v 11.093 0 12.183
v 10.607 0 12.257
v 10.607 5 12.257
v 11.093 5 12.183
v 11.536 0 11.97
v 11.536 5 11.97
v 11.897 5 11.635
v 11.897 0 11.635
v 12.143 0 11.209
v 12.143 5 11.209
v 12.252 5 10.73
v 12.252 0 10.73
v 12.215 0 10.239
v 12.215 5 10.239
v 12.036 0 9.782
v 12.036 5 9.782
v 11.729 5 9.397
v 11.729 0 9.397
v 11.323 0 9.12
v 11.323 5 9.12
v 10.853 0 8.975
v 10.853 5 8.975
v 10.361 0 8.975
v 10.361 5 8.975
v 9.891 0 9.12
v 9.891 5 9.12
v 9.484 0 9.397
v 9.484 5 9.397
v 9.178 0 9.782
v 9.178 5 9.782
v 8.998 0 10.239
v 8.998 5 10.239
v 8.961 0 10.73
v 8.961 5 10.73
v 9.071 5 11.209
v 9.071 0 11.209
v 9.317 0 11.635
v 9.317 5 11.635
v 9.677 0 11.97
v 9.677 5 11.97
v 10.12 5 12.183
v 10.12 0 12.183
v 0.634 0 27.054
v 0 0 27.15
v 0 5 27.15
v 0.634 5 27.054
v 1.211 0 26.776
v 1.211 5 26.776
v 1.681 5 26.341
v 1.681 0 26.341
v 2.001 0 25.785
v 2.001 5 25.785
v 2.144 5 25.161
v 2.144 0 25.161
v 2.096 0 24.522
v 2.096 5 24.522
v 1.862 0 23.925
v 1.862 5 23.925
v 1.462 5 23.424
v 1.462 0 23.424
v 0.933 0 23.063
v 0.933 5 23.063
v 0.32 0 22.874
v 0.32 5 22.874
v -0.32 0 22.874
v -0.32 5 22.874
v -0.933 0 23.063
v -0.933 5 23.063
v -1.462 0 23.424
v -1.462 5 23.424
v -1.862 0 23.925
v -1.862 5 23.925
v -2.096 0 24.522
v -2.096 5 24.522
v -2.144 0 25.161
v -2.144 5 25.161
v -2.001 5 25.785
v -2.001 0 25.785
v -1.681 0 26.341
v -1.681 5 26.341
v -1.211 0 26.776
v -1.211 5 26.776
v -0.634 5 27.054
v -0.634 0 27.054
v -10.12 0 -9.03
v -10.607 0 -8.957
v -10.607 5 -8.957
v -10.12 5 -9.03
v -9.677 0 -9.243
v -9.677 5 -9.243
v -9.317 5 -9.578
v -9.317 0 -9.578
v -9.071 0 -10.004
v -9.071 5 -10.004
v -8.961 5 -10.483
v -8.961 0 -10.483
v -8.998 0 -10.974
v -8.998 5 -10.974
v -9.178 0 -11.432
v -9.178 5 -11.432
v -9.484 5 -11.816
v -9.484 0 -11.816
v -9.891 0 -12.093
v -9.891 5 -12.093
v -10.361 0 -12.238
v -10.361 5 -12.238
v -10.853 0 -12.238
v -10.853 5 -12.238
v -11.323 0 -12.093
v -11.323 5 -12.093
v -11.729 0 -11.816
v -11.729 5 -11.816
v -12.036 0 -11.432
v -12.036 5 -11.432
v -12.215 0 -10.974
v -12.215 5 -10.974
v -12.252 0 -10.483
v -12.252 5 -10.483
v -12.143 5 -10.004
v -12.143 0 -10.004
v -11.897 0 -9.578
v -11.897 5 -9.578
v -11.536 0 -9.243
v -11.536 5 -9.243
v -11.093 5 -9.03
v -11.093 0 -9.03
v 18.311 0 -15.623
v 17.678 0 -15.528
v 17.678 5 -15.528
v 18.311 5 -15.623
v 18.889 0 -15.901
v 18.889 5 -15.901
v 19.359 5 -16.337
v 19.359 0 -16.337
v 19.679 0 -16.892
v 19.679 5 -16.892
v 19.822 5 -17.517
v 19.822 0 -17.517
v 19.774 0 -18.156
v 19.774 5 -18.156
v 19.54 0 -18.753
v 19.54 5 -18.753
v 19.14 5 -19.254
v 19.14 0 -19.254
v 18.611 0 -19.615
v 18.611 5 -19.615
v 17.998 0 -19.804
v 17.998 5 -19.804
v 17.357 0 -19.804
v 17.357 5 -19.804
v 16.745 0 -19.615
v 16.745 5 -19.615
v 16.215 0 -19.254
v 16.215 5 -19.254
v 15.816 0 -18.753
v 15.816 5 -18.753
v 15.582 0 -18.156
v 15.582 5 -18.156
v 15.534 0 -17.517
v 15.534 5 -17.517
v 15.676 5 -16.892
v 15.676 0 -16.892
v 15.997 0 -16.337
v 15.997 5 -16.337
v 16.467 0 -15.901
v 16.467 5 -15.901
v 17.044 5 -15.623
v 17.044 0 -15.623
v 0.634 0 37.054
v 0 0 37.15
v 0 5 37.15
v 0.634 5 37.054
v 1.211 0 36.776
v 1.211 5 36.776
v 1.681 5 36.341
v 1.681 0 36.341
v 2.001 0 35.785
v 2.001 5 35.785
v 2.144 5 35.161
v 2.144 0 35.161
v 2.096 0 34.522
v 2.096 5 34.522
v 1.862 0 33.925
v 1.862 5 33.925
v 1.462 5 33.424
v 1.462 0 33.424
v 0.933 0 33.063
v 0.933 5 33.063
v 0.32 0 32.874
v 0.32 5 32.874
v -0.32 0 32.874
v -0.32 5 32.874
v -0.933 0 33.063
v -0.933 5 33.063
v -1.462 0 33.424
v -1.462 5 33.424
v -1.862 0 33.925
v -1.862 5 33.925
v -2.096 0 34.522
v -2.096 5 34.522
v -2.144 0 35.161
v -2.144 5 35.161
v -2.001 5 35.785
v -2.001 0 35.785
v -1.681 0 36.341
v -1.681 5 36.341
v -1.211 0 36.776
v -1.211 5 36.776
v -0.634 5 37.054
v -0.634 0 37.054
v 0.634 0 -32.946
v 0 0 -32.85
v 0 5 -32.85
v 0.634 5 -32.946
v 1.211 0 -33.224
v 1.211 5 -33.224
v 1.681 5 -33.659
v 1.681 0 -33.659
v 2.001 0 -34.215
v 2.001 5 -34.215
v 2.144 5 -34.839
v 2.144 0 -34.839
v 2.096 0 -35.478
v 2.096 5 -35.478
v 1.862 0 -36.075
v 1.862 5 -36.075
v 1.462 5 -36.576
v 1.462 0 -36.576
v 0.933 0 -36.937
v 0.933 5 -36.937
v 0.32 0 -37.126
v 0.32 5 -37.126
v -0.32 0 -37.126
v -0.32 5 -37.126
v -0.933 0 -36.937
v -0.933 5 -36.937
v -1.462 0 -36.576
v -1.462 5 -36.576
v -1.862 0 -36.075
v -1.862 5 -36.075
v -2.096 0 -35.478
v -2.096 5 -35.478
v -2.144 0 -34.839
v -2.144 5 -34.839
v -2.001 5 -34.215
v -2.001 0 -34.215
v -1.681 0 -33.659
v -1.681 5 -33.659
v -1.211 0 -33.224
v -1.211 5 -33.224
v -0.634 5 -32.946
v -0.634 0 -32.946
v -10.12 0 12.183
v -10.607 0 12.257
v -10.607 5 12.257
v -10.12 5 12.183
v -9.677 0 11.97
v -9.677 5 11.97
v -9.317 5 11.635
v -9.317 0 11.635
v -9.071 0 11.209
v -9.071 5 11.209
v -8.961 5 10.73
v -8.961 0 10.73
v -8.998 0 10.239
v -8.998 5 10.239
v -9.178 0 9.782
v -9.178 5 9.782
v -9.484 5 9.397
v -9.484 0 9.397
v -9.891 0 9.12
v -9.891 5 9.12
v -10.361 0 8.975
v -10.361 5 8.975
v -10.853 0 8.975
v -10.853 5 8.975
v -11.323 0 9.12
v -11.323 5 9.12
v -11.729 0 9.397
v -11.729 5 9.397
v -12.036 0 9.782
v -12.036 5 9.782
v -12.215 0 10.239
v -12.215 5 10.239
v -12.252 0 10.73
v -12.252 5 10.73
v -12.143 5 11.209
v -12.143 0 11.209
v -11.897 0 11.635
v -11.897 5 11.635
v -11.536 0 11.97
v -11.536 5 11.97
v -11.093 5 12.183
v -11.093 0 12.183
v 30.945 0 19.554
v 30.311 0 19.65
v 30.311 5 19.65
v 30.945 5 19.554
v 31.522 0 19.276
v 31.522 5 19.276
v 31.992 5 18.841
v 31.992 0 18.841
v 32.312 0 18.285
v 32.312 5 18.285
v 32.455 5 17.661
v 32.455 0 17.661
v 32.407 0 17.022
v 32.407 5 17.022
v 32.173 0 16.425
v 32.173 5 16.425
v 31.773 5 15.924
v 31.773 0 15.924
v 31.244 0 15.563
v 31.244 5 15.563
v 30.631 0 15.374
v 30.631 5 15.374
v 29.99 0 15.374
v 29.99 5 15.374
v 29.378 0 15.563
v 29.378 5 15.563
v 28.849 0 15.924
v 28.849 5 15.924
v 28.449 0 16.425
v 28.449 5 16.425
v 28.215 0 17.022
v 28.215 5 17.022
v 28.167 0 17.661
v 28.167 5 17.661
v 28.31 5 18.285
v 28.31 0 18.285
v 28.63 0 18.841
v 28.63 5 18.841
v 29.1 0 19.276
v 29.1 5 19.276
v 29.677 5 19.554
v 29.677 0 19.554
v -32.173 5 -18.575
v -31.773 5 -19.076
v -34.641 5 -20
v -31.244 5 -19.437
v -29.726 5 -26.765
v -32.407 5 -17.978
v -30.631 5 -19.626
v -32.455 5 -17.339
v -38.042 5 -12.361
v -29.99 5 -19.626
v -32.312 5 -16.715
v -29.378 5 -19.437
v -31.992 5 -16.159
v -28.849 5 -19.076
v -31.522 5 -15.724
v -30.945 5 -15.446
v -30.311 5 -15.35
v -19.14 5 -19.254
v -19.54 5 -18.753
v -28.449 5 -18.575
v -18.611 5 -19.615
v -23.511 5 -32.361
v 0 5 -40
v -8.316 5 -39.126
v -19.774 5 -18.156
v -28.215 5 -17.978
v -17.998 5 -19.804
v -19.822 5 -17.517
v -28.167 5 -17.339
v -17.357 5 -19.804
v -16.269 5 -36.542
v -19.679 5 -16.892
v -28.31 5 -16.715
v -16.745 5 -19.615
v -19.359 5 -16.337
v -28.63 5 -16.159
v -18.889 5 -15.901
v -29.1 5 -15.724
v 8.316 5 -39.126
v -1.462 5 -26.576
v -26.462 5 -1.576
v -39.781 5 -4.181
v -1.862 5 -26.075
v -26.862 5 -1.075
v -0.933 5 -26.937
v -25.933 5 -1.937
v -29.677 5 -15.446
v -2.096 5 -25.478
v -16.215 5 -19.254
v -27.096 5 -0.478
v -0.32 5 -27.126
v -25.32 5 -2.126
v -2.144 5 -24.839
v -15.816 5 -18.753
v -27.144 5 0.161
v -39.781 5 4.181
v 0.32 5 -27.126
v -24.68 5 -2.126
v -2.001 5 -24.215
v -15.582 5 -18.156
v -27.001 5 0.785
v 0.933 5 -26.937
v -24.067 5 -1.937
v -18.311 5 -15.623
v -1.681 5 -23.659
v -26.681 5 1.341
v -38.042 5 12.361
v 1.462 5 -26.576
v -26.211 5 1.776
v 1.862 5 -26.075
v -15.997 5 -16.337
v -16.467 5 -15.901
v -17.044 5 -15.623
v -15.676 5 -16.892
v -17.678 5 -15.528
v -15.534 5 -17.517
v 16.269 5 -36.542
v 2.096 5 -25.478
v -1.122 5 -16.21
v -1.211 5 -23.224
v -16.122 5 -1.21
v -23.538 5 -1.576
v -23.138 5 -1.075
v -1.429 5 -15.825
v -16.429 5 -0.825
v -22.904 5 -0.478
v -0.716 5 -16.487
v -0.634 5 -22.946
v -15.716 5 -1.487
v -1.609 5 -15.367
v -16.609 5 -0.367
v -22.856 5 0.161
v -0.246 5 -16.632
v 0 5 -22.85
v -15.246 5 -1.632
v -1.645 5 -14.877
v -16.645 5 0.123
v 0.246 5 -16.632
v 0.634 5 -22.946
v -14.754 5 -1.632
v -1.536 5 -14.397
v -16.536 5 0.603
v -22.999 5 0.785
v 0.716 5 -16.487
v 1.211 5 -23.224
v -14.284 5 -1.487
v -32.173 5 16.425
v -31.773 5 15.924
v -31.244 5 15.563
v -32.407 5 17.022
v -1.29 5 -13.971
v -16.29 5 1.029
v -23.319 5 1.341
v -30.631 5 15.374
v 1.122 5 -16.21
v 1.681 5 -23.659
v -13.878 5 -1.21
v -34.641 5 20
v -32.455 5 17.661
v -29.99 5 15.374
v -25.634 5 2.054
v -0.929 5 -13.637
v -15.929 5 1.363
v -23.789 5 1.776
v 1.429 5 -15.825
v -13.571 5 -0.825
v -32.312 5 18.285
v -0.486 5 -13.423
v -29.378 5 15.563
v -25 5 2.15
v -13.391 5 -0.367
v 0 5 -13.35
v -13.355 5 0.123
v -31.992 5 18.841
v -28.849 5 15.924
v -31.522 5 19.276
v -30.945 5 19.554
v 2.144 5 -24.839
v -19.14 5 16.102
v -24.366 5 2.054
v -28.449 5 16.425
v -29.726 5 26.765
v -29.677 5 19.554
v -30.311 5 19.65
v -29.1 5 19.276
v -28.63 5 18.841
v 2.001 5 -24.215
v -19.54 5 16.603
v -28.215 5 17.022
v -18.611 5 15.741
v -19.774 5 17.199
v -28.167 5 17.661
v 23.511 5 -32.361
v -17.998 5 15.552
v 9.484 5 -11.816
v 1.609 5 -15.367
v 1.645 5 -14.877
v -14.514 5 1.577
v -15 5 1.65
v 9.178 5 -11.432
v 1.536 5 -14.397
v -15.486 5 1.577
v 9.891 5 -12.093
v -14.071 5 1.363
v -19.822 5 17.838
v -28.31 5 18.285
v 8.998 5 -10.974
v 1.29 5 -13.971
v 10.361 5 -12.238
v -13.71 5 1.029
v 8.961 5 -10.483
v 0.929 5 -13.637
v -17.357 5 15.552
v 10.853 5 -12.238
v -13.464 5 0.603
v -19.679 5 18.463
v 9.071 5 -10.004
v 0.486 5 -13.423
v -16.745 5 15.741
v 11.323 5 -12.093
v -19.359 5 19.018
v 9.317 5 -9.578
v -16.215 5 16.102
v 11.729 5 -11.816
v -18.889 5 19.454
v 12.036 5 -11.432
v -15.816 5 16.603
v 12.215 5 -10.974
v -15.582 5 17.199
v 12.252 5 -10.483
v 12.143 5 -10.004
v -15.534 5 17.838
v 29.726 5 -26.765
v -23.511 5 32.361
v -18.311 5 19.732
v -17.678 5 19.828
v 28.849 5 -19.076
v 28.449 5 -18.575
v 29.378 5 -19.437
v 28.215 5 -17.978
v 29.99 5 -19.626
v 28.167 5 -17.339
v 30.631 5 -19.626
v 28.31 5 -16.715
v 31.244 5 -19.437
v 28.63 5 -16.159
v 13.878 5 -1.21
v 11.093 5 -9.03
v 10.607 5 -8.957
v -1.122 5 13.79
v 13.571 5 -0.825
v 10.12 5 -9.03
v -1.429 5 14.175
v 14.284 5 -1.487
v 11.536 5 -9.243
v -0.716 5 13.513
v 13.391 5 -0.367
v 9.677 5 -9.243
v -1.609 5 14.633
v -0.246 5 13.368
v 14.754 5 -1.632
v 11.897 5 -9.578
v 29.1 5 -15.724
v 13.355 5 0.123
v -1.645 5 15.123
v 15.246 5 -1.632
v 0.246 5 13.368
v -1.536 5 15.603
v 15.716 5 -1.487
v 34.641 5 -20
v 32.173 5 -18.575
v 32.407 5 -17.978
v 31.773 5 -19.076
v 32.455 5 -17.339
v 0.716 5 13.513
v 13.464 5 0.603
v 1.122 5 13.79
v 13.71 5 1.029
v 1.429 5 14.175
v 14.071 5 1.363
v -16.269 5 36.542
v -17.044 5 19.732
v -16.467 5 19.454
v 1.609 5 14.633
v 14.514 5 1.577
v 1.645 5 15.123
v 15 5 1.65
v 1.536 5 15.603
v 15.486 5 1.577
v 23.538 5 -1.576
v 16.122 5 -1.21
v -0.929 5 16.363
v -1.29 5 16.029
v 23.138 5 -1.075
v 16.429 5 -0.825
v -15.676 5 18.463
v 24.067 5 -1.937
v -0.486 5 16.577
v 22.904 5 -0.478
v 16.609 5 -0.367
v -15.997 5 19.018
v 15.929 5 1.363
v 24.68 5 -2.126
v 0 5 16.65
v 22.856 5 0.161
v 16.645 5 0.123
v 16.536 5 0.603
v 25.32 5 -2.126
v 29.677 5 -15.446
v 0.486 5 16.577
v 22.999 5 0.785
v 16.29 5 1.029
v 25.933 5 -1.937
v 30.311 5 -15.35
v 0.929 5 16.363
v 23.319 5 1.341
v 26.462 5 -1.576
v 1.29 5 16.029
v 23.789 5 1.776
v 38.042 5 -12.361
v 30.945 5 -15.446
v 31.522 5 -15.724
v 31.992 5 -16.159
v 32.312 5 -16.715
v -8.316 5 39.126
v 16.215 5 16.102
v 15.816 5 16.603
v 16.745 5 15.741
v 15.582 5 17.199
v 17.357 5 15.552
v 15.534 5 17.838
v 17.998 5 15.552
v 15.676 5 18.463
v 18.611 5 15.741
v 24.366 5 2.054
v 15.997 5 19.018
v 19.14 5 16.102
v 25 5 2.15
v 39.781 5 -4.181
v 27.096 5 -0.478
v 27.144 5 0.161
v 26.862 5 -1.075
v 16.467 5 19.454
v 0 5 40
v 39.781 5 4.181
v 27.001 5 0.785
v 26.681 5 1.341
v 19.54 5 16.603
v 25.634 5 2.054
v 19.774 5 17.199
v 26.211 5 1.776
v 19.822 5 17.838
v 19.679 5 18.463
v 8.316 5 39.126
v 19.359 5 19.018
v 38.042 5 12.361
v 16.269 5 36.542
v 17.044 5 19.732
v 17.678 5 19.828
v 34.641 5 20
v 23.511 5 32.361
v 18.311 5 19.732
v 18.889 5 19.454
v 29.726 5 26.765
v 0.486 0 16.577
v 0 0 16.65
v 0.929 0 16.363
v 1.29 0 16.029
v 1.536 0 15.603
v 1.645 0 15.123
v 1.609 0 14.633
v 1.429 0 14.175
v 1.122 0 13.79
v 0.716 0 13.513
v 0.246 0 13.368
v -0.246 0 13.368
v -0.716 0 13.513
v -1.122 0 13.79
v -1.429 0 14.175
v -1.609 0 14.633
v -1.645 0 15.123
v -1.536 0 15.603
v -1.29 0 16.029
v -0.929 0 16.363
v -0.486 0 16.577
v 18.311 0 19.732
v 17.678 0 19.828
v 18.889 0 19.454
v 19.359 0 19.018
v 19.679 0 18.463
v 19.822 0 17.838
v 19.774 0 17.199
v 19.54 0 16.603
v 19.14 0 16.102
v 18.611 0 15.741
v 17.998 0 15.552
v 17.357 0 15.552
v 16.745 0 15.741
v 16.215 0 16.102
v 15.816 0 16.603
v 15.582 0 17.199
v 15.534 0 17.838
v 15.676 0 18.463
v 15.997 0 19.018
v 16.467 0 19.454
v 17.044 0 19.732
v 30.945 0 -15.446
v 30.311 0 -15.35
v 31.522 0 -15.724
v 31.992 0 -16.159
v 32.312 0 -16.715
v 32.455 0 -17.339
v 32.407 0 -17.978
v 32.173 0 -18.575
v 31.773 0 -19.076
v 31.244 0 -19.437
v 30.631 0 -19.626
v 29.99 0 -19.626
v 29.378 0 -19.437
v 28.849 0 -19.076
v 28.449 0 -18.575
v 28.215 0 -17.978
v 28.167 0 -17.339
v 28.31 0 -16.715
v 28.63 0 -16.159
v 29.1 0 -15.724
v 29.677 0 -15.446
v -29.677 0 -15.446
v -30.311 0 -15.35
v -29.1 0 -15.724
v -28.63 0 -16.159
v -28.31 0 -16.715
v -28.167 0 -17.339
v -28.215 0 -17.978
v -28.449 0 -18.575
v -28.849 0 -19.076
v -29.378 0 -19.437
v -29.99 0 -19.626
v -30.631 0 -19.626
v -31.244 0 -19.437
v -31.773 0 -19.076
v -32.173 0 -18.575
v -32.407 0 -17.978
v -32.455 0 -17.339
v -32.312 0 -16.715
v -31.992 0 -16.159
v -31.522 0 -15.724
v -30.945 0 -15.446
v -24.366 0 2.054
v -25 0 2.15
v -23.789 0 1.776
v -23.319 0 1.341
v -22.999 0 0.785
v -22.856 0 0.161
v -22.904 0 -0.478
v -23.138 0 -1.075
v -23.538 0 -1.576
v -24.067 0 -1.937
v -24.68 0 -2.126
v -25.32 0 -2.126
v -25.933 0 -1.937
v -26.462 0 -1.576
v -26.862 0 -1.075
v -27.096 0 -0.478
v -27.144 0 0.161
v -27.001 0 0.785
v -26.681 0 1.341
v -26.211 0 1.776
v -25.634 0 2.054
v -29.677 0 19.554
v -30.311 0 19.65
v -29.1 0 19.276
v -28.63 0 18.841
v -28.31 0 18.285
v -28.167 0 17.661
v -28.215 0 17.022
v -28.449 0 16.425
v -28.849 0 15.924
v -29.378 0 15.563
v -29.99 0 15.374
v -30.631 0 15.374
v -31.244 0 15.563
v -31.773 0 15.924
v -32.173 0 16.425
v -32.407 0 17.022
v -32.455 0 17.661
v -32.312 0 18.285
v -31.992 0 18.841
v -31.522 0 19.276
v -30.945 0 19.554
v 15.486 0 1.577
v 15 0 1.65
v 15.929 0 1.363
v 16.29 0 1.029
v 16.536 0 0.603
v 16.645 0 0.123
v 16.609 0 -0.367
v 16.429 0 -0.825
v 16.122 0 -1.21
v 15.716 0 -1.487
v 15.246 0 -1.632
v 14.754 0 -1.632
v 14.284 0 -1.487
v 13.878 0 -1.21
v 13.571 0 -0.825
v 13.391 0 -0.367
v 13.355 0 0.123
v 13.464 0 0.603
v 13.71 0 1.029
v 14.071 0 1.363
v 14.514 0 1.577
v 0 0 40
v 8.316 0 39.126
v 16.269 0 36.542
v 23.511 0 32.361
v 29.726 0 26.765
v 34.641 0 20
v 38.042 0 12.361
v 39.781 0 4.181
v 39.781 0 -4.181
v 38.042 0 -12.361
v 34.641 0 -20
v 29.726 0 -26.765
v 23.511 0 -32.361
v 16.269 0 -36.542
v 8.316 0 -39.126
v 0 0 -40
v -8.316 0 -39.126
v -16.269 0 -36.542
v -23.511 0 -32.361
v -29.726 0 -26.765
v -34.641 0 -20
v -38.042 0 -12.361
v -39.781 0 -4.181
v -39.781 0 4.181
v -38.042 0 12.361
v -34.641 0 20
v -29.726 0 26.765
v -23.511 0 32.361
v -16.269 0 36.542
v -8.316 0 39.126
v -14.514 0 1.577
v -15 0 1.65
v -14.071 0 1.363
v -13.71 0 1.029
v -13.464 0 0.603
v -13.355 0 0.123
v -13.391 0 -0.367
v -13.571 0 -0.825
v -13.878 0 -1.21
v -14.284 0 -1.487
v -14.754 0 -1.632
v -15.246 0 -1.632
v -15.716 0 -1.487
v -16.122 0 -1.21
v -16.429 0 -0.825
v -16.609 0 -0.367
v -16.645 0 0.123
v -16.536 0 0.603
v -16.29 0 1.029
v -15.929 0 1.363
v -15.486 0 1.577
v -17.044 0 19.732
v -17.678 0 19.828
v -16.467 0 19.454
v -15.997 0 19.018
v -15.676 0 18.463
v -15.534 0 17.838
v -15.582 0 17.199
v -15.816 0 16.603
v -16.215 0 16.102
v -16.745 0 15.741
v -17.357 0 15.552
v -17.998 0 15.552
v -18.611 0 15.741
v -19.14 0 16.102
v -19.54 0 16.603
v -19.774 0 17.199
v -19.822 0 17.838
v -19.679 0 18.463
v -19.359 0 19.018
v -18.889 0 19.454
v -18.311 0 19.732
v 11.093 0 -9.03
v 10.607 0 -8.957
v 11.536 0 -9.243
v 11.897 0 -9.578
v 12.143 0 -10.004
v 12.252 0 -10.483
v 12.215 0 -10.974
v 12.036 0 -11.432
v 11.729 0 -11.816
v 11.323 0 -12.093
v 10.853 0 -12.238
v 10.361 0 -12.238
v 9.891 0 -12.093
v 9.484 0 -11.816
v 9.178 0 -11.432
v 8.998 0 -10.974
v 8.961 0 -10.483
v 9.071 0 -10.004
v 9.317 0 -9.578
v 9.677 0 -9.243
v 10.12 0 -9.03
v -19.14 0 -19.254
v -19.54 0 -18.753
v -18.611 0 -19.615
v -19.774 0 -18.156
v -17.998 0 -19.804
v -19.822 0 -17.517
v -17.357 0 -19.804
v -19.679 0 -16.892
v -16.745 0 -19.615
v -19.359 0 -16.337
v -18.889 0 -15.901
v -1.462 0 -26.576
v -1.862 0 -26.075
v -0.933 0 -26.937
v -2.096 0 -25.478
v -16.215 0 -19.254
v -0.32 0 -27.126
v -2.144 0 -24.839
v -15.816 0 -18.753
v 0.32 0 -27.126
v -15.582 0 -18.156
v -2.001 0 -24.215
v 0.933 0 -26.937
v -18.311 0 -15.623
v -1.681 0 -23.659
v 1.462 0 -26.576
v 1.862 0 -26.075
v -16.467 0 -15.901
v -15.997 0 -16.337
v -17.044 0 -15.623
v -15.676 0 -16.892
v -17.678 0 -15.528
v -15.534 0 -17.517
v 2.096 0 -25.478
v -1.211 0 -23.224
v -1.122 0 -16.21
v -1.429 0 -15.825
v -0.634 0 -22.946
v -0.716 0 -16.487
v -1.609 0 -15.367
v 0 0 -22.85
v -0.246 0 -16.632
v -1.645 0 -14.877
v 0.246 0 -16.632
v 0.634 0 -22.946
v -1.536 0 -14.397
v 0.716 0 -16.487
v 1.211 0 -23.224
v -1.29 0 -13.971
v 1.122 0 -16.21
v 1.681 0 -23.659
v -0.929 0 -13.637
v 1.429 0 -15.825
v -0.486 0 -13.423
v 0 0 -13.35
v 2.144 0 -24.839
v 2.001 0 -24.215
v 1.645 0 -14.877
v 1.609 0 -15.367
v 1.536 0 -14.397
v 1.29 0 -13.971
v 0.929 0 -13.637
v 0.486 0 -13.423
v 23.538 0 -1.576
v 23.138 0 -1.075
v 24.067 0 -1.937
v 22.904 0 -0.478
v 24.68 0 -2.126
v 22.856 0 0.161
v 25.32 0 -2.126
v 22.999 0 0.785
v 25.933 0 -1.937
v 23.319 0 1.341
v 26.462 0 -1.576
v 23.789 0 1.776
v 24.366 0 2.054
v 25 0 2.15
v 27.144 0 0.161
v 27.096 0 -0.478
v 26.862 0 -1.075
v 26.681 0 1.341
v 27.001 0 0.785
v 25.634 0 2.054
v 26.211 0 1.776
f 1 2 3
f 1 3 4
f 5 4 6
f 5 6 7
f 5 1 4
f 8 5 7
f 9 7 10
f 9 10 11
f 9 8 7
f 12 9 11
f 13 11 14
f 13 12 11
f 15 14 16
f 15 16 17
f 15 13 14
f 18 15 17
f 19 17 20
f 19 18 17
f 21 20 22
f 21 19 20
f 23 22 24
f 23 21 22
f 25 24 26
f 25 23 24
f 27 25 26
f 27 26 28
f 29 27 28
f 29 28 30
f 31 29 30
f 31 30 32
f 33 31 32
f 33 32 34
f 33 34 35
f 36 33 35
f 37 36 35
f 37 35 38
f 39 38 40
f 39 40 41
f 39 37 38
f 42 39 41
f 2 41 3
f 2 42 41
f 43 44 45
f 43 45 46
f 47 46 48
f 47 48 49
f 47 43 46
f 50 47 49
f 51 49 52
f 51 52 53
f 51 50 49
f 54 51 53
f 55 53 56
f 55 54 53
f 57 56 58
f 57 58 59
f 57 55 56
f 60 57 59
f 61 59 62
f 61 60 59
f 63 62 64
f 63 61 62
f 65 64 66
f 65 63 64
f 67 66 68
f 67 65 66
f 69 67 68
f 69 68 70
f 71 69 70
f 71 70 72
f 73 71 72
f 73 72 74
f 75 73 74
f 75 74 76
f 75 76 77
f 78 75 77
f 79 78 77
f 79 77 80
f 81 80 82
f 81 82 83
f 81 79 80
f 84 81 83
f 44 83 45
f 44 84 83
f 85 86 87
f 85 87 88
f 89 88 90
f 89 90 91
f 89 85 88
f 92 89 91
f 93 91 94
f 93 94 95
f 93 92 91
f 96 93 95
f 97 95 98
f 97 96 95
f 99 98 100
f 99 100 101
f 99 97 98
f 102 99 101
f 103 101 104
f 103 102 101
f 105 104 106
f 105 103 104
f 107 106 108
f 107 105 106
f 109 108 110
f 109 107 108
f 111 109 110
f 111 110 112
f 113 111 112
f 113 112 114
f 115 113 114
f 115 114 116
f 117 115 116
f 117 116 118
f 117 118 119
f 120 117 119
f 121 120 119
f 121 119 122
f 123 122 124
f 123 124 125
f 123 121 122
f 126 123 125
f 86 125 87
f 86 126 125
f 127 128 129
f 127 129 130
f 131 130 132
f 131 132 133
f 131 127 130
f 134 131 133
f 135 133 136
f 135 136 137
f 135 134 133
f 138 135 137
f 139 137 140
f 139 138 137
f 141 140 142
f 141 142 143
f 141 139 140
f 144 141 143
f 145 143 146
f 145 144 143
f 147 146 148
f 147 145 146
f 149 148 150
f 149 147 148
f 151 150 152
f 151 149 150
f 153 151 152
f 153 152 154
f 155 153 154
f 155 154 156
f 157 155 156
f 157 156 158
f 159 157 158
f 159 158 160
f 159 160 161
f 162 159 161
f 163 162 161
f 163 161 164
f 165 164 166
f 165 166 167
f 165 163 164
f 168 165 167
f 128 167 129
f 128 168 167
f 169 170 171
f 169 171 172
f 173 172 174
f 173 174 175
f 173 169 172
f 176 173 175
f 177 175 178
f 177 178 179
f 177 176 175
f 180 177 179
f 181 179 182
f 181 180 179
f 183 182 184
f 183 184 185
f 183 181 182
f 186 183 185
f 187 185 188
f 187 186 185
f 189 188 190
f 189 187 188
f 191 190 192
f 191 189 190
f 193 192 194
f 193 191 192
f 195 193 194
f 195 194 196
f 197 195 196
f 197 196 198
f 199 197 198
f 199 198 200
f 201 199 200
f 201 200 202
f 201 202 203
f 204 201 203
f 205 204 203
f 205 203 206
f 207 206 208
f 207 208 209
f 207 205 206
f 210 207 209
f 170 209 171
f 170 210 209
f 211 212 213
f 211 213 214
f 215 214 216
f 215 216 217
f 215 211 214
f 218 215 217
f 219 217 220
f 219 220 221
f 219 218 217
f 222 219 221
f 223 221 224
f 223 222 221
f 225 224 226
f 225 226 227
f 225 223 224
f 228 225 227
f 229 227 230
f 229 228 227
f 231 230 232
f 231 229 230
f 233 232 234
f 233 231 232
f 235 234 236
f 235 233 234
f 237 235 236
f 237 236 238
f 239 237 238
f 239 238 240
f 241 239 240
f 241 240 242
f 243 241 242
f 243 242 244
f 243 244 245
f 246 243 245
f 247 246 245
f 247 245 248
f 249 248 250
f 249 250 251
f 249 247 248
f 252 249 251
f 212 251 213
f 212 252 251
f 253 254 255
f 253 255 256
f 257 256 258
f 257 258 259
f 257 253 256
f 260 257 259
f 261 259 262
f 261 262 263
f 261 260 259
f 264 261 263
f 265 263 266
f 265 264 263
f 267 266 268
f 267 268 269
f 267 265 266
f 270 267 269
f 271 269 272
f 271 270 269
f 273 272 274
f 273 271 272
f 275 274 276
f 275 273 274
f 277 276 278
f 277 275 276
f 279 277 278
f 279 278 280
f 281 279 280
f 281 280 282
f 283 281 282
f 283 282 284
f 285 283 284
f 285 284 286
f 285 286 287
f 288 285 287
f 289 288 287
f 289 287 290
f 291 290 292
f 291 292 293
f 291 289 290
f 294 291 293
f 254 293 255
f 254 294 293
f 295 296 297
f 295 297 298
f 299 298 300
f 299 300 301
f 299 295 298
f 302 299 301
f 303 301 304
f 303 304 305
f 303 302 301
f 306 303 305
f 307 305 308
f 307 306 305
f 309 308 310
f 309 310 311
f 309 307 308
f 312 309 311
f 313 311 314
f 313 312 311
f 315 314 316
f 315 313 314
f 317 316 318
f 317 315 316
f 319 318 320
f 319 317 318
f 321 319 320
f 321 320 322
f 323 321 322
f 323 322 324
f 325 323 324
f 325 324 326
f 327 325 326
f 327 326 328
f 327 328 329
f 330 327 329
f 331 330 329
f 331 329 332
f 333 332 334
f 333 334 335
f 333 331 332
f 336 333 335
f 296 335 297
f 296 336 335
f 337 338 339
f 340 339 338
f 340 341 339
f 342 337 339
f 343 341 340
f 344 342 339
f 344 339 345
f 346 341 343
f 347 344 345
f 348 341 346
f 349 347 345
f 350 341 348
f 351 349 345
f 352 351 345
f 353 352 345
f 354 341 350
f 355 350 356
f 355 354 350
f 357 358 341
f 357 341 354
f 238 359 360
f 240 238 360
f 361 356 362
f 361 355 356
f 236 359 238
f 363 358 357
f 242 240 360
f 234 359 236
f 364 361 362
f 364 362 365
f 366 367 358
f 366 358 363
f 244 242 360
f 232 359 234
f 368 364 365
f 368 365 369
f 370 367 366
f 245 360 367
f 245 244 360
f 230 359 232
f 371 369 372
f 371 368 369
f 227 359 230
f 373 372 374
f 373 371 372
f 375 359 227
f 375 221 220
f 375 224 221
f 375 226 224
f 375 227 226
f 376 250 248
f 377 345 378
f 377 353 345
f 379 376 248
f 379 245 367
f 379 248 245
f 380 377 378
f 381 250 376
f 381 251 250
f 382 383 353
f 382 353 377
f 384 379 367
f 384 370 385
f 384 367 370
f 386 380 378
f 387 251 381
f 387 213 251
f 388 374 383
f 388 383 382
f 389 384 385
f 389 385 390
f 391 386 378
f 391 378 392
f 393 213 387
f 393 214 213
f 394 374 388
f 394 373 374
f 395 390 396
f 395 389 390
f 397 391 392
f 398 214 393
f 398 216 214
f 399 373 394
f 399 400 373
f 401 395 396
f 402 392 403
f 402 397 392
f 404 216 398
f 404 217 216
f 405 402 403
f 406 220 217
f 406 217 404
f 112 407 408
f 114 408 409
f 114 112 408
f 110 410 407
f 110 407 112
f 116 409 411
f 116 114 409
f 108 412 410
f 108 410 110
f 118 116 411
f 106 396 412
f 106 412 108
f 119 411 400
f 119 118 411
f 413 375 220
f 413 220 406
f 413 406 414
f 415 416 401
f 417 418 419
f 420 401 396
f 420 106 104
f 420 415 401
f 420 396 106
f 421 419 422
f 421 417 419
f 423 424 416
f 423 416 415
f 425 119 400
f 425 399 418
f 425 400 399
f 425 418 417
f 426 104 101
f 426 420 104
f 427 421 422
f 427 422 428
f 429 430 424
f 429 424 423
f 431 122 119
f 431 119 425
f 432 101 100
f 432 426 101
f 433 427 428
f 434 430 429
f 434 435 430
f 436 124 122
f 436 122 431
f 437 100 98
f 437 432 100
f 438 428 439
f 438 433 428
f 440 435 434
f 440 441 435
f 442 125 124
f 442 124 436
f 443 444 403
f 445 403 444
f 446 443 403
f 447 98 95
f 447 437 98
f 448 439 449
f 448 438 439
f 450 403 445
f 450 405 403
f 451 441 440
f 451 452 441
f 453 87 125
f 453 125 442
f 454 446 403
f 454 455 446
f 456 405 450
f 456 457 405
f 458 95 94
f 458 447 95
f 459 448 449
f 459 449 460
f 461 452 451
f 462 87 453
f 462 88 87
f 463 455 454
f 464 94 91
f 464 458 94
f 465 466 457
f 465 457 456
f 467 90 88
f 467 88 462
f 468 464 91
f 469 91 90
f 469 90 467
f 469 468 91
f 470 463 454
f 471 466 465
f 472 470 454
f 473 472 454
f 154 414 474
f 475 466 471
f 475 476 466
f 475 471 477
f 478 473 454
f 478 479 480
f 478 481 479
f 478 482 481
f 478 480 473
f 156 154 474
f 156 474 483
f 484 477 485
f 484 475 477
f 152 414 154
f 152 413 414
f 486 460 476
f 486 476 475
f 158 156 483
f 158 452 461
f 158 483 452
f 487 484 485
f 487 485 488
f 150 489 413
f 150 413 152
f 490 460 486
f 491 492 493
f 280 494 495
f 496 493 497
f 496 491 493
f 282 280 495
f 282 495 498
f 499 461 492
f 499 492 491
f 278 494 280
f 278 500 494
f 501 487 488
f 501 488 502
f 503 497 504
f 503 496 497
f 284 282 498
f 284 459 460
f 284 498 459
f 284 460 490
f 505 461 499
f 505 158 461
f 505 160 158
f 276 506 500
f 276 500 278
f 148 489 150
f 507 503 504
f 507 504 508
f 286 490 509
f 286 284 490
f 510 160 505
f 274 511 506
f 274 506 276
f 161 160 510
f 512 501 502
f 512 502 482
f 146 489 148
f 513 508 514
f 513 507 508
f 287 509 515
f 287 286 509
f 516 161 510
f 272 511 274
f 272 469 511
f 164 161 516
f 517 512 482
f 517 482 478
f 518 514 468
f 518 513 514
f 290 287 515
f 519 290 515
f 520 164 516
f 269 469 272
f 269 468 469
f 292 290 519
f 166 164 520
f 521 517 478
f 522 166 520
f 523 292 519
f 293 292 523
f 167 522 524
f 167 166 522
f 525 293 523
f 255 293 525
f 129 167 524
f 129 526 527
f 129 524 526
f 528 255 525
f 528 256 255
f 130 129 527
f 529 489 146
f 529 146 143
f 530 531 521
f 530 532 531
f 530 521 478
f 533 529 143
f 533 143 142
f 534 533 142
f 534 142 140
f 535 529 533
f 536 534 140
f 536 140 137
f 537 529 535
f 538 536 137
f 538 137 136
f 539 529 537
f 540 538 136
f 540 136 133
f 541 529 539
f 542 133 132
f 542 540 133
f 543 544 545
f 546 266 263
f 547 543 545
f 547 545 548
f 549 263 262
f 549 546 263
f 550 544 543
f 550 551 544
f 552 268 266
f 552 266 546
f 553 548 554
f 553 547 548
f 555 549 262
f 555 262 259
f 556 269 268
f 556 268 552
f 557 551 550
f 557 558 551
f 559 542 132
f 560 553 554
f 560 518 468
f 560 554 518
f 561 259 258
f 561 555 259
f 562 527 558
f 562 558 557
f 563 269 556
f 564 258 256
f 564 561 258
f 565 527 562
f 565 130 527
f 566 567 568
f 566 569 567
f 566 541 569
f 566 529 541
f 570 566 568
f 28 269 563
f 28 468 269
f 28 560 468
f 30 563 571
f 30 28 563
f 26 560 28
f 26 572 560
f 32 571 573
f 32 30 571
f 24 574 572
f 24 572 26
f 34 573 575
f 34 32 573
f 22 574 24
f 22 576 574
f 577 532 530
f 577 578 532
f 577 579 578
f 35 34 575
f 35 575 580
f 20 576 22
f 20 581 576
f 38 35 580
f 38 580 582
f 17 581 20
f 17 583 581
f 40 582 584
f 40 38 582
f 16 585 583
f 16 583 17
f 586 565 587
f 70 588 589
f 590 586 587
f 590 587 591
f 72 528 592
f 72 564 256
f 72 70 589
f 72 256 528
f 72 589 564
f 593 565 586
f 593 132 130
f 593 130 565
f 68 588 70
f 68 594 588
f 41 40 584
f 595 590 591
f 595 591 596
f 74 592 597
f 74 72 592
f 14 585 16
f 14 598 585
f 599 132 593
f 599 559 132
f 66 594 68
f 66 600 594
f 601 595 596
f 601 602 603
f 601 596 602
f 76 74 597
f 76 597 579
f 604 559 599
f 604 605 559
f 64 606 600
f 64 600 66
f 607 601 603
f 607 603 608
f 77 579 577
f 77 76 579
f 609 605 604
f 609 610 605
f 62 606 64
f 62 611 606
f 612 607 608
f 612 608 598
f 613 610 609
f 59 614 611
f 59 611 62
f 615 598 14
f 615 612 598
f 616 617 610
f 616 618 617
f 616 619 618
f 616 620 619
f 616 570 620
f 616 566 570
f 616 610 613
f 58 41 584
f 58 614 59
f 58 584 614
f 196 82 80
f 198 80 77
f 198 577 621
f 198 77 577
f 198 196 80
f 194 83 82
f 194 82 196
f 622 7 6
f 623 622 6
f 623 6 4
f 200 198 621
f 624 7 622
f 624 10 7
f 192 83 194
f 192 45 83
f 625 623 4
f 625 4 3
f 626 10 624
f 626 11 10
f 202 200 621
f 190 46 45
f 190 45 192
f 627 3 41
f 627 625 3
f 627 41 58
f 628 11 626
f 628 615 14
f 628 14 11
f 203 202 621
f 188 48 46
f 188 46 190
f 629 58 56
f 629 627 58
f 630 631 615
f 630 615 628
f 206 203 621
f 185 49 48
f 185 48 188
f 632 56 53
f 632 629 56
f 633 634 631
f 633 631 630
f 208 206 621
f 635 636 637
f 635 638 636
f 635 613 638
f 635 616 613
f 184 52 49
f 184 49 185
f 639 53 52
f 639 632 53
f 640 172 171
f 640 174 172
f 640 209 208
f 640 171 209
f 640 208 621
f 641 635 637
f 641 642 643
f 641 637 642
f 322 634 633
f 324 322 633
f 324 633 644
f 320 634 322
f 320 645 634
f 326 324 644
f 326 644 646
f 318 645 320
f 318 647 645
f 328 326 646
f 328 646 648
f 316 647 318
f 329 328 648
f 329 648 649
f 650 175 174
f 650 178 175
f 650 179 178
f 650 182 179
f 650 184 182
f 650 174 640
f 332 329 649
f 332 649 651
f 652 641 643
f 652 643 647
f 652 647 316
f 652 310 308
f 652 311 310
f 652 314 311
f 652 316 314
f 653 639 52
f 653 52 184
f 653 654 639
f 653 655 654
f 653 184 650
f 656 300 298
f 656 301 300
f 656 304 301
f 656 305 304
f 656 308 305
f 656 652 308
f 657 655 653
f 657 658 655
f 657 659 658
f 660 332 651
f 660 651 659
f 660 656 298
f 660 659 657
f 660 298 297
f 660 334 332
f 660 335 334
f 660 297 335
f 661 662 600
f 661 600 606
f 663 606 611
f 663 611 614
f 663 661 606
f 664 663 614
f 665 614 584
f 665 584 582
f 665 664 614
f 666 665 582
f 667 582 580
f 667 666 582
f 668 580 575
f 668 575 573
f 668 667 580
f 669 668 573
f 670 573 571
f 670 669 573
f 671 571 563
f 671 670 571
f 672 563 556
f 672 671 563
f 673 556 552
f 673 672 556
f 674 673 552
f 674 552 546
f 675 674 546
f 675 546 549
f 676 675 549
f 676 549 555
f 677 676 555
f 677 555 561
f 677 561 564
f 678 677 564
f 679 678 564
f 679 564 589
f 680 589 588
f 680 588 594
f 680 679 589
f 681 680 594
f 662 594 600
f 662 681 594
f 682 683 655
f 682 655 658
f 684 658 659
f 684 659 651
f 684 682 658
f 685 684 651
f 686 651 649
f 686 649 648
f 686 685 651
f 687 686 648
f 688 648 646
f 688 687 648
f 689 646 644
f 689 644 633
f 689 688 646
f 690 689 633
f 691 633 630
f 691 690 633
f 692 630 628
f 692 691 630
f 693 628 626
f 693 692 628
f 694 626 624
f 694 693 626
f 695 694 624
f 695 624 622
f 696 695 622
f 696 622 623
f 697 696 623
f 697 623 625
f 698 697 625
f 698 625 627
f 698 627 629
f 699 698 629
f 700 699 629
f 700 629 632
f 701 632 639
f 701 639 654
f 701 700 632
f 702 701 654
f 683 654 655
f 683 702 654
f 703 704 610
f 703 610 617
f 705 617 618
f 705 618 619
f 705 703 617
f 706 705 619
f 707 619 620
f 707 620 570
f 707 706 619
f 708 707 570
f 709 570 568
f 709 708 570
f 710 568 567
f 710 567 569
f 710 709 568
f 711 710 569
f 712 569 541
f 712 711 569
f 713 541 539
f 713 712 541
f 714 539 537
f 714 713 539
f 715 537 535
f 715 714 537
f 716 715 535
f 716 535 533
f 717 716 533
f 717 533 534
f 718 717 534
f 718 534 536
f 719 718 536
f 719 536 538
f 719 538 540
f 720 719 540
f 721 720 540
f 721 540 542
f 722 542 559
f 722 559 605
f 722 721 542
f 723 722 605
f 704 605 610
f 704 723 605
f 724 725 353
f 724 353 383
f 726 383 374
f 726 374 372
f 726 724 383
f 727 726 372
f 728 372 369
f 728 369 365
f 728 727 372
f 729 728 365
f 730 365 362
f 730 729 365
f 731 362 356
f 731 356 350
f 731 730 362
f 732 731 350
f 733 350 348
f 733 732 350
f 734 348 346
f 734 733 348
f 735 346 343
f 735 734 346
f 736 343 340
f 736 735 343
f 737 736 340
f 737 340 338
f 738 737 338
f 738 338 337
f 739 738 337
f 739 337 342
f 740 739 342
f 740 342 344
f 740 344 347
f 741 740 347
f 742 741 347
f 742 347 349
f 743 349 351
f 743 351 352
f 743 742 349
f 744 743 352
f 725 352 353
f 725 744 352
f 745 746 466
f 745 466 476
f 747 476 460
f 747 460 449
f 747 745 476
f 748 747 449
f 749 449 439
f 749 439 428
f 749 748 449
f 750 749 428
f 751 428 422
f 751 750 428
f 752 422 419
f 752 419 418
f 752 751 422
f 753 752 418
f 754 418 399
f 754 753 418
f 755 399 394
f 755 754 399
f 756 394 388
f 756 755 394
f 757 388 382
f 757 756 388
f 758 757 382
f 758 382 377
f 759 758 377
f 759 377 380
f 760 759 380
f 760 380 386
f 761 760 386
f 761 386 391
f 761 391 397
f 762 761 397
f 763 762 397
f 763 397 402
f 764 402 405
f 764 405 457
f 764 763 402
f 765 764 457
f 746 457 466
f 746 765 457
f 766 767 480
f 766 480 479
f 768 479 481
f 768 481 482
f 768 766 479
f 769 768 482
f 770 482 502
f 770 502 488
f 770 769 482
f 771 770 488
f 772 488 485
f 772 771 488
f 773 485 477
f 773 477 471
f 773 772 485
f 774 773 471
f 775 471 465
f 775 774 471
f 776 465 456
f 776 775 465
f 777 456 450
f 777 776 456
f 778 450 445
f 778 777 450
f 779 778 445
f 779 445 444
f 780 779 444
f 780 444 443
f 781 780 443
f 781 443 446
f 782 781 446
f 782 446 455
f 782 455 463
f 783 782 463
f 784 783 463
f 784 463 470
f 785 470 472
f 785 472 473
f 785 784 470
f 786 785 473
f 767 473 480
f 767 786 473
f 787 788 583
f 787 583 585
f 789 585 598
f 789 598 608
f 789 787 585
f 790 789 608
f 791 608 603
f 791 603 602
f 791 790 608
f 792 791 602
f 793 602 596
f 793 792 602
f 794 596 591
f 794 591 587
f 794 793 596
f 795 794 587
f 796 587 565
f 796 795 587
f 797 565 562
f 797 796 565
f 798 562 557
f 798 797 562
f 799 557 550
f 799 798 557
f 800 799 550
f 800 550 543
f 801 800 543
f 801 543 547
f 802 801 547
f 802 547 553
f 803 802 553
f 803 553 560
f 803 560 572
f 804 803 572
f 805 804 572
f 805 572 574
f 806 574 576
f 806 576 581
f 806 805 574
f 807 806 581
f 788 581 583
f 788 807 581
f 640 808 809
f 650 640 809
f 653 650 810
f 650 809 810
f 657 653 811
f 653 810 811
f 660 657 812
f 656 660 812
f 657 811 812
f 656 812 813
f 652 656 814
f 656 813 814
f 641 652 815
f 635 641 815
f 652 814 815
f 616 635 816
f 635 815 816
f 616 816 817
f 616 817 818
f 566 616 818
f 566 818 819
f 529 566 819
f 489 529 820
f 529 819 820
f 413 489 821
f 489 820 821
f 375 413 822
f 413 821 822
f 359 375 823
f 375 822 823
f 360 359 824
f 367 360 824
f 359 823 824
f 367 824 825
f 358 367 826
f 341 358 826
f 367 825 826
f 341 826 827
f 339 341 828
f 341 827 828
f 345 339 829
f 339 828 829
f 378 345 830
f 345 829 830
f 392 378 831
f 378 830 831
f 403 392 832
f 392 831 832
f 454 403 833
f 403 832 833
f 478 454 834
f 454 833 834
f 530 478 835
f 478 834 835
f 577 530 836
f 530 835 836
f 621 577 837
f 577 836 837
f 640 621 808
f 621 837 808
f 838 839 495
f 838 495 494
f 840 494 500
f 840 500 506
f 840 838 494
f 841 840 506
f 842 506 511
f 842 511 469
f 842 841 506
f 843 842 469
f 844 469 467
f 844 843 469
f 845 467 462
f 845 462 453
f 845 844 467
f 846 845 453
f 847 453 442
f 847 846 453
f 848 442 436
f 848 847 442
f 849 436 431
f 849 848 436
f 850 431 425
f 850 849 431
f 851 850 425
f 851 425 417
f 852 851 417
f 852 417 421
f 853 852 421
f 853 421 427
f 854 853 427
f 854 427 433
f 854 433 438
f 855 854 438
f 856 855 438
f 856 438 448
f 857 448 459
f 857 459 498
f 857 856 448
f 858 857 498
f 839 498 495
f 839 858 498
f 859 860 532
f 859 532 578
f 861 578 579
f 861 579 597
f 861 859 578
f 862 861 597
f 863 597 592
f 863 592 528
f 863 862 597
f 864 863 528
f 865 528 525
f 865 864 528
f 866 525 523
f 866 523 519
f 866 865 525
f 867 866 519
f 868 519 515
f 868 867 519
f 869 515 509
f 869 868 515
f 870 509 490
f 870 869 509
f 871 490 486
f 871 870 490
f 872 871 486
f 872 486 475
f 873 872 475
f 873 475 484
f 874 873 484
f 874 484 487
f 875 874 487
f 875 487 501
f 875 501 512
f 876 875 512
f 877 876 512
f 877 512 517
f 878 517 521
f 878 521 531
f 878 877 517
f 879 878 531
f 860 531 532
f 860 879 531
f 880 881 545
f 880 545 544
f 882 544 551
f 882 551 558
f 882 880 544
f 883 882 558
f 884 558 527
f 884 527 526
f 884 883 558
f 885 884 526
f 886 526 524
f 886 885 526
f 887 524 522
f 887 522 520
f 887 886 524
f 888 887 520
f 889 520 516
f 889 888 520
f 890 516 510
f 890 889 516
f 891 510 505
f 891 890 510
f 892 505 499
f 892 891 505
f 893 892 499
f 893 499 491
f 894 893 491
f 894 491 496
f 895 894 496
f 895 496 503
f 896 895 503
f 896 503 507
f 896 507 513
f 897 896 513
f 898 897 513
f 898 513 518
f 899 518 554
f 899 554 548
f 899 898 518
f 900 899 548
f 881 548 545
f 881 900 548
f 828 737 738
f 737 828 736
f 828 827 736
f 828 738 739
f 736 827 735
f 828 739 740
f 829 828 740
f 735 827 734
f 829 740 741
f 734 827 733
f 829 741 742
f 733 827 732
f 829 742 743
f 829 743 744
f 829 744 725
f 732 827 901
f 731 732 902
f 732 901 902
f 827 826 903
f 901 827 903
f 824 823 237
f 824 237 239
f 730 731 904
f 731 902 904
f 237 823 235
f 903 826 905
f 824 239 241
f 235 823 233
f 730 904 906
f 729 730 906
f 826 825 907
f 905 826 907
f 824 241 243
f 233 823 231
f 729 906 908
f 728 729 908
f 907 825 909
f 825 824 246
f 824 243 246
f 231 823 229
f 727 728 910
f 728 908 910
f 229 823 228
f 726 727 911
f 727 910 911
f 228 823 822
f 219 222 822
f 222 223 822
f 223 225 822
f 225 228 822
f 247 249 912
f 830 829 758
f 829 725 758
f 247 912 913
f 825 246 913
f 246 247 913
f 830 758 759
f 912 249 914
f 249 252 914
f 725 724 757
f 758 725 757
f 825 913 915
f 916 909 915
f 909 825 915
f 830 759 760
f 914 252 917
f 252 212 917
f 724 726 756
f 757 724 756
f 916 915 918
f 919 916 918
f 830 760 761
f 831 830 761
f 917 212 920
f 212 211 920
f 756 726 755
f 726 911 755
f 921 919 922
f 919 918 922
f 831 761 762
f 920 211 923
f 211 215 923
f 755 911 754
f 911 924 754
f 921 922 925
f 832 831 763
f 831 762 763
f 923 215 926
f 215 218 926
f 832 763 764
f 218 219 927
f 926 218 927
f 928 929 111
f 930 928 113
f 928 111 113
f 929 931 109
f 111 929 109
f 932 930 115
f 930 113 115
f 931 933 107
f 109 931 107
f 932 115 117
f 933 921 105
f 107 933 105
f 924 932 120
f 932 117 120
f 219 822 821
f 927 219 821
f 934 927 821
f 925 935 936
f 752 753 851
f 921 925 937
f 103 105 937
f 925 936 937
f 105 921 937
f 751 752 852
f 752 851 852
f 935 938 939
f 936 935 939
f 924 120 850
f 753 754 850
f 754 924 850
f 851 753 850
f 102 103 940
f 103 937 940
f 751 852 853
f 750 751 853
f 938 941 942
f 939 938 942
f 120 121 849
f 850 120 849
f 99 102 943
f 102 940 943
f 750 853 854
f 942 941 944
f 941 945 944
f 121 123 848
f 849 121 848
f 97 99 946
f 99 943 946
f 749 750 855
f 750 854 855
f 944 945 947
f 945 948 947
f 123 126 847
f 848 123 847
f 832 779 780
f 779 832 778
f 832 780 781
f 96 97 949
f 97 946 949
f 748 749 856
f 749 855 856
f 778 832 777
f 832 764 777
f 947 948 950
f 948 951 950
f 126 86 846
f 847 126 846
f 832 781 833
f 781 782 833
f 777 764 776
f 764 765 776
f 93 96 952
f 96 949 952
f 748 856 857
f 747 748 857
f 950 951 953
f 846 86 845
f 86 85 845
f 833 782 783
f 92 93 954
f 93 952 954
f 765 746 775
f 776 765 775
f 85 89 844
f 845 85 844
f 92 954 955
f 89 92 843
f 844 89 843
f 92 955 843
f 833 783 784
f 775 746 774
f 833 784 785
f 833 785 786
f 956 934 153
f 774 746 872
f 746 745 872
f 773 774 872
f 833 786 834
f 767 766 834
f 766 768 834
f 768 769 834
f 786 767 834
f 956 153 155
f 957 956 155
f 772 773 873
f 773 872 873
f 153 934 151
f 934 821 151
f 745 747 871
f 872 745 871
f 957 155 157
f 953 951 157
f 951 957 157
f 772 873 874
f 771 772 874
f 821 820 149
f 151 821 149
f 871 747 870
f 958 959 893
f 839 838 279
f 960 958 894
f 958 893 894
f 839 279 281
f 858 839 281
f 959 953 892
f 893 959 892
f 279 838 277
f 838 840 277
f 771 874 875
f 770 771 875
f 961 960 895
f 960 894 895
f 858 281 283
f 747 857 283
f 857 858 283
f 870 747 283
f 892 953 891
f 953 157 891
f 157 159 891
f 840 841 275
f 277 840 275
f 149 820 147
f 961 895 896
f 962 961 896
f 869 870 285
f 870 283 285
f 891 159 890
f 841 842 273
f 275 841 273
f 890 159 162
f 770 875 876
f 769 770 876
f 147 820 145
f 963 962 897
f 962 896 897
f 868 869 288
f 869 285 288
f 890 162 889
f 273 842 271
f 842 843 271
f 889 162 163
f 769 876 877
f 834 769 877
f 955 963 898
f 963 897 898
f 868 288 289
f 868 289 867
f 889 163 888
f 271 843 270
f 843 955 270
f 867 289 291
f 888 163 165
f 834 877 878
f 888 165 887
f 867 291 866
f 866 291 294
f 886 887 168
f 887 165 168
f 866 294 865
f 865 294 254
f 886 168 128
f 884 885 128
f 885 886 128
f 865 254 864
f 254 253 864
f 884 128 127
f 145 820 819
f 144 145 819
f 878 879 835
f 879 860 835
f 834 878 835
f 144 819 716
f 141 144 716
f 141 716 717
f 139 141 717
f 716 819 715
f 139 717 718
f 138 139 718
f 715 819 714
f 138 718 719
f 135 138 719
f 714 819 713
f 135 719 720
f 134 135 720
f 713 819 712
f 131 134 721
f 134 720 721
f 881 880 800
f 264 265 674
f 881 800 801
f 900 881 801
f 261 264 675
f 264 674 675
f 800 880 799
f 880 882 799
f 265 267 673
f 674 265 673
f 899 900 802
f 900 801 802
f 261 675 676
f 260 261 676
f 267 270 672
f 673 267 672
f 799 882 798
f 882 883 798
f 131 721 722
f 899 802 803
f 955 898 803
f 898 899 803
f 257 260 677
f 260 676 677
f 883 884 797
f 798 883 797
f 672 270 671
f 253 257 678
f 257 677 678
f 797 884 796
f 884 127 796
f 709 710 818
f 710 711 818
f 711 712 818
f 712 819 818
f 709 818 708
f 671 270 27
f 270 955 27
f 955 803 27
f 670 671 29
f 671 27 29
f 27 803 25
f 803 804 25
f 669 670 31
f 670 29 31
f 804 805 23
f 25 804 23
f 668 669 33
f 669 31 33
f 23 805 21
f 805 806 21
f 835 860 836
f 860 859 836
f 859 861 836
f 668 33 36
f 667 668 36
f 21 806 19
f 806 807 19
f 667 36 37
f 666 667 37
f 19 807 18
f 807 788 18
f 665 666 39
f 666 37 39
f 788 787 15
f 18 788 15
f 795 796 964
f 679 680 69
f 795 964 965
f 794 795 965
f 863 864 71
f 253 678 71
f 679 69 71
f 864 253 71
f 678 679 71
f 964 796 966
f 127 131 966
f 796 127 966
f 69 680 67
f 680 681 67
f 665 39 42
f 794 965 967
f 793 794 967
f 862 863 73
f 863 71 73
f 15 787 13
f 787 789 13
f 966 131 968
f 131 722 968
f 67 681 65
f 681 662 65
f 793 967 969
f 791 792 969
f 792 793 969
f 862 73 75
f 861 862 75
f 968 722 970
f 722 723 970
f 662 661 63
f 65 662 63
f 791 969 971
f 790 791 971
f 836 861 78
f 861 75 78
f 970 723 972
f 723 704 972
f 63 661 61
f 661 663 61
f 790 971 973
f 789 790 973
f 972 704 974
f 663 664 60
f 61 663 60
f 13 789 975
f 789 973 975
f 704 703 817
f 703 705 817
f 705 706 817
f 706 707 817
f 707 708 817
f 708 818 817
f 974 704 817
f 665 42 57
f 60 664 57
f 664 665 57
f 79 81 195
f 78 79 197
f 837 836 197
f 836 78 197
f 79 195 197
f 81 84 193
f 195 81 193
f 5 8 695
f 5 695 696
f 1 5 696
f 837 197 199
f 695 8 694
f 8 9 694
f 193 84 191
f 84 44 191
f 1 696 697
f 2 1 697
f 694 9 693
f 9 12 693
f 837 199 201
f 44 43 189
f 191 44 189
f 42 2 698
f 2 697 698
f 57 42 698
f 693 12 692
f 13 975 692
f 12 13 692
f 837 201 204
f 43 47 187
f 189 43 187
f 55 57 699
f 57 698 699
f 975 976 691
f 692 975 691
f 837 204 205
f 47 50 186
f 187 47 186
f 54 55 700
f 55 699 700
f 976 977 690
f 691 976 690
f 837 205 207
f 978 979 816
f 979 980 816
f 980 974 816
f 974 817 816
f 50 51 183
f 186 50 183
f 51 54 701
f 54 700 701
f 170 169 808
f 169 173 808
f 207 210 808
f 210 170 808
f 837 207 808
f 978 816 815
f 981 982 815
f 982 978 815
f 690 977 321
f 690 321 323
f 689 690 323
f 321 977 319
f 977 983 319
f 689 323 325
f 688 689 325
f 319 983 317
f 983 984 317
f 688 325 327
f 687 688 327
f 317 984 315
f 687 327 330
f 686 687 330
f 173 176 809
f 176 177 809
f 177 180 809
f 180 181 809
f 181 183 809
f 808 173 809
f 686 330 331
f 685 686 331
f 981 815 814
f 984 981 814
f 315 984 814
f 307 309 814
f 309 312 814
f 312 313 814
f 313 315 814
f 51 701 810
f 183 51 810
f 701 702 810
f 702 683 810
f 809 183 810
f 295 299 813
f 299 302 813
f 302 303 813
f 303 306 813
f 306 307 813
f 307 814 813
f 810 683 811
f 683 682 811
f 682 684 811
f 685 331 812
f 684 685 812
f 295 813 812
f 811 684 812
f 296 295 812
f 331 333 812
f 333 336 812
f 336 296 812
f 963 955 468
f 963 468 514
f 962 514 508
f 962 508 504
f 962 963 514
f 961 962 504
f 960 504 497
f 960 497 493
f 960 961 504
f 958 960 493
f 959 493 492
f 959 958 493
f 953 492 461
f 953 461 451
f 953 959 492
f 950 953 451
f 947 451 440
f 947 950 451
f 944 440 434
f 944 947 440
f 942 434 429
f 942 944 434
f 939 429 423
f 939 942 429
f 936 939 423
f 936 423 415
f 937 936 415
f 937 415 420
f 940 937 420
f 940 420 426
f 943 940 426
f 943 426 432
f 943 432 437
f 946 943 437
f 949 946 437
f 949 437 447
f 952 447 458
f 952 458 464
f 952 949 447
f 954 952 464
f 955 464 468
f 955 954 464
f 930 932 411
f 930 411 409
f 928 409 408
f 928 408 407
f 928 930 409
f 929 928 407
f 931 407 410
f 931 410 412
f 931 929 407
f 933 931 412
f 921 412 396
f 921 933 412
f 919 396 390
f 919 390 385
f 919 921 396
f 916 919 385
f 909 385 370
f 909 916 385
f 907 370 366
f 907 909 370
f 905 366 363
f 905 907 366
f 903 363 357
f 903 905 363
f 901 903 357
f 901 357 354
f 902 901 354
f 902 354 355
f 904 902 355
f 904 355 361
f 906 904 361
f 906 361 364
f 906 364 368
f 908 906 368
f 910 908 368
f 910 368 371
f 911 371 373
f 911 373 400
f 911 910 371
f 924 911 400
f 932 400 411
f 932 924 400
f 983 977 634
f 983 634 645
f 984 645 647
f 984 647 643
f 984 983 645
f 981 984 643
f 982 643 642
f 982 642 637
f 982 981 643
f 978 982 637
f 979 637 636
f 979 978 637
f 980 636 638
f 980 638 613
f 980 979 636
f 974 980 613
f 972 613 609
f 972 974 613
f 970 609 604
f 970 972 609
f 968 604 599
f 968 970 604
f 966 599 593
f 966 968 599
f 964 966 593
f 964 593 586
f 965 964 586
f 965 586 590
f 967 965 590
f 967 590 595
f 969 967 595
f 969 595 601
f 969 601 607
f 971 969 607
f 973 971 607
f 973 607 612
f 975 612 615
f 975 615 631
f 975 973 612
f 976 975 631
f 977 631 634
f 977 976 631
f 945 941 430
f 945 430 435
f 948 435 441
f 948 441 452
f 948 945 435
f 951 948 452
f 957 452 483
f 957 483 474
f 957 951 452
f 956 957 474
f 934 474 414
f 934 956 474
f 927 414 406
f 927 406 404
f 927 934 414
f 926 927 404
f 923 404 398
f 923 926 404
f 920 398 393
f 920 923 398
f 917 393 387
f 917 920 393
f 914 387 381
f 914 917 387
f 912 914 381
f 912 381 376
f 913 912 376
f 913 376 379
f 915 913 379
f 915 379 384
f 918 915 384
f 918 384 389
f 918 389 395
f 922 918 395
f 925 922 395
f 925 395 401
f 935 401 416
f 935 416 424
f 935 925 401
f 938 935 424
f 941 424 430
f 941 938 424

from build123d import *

# Parameters (mm, degrees)
SKETCH_1_R      = 40
SKETCH_1_R_2    = 2.15
SKETCH_1_R_3    = 1.65
EXTRUDE_2_DEPTH = 5


with BuildPart() as part:
    # 草图1 → 凸台-拉伸2 (new body)
    with BuildSketch(Plane(origin=(0, 0, 0), x_dir=(1, 0, 0), z_dir=(0, 1, 0))):
        with Locations(Location((0, 0, 0), (0, 0, 270))):
            Circle(SKETCH_1_R)
        with Locations(Location((0, 35, 0), (0, 0, 270))):
            Circle(SKETCH_1_R_2, mode=Mode.SUBTRACT)
        with Locations(Location((30.310889132, 17.5, 0), (0, 0, 270))):
            Circle(SKETCH_1_R_2, mode=Mode.SUBTRACT)
        with Locations(Location((30.310889132, -17.5, 0), (0, 0, 270))):
            Circle(SKETCH_1_R_2, mode=Mode.SUBTRACT)
        with Locations(Location((0, -35, 0), (0, 0, 270))):
            Circle(SKETCH_1_R_2, mode=Mode.SUBTRACT)
        with Locations(Location((-30.310889132, -17.5, 0), (0, 0, 270))):
            Circle(SKETCH_1_R_2, mode=Mode.SUBTRACT)
        with Locations(Location((-30.310889132, 17.5, 0), (0, 0, 270))):
            Circle(SKETCH_1_R_2, mode=Mode.SUBTRACT)
        with Locations(Location((0, 25, 0), (0, 0, 270))):
            Circle(SKETCH_1_R_2, mode=Mode.SUBTRACT)
        with Locations(Location((17.67766953, 17.67766953, 0), (0, 0, 270))):
            Circle(SKETCH_1_R_2, mode=Mode.SUBTRACT)
        with Locations(Location((25, 0, 0), (0, 0, 270))):
            Circle(SKETCH_1_R_2, mode=Mode.SUBTRACT)
        with Locations(Location((17.67766953, -17.67766953, 0), (0, 0, 270))):
            Circle(SKETCH_1_R_2, mode=Mode.SUBTRACT)
        with Locations(Location((0, -25, 0), (0, 0, 270))):
            Circle(SKETCH_1_R_2, mode=Mode.SUBTRACT)
        with Locations(Location((-17.67766953, -17.67766953, 0), (0, 0, 270))):
            Circle(SKETCH_1_R_2, mode=Mode.SUBTRACT)
        with Locations(Location((-25, 0, 0), (0, 0, 270))):
            Circle(SKETCH_1_R_2, mode=Mode.SUBTRACT)
        with Locations(Location((-17.67766953, 17.67766953, 0), (0, 0, 270))):
            Circle(SKETCH_1_R_2, mode=Mode.SUBTRACT)
        with Locations(Location((0, 15, 0), (0, 0, 270))):
            Circle(SKETCH_1_R_3, mode=Mode.SUBTRACT)
        with Locations(Location((10.606601718, 10.606601718, 0), (0, 0, 270))):
            Circle(SKETCH_1_R_3, mode=Mode.SUBTRACT)
        with Locations(Location((15, 0, 0), (0, 0, 270))):
            Circle(SKETCH_1_R_3, mode=Mode.SUBTRACT)
        with Locations(Location((10.606601718, -10.606601718, 0), (0, 0, 270))):
            Circle(SKETCH_1_R_3, mode=Mode.SUBTRACT)
        with Locations(Location((0, -15, 0), (0, 0, 270))):
            Circle(SKETCH_1_R_3, mode=Mode.SUBTRACT)
        with Locations(Location((-10.606601718, -10.606601718, 0), (0, 0, 270))):
            Circle(SKETCH_1_R_3, mode=Mode.SUBTRACT)
        with Locations(Location((-15, 0, 0), (0, 0, 270))):
            Circle(SKETCH_1_R_3, mode=Mode.SUBTRACT)
        with Locations(Location((-10.606601718, 10.606601718, 0), (0, 0, 270))):
            Circle(SKETCH_1_R_3, mode=Mode.SUBTRACT)
    extrude(amount=EXTRUDE_2_DEPTH)


solid = part.part
